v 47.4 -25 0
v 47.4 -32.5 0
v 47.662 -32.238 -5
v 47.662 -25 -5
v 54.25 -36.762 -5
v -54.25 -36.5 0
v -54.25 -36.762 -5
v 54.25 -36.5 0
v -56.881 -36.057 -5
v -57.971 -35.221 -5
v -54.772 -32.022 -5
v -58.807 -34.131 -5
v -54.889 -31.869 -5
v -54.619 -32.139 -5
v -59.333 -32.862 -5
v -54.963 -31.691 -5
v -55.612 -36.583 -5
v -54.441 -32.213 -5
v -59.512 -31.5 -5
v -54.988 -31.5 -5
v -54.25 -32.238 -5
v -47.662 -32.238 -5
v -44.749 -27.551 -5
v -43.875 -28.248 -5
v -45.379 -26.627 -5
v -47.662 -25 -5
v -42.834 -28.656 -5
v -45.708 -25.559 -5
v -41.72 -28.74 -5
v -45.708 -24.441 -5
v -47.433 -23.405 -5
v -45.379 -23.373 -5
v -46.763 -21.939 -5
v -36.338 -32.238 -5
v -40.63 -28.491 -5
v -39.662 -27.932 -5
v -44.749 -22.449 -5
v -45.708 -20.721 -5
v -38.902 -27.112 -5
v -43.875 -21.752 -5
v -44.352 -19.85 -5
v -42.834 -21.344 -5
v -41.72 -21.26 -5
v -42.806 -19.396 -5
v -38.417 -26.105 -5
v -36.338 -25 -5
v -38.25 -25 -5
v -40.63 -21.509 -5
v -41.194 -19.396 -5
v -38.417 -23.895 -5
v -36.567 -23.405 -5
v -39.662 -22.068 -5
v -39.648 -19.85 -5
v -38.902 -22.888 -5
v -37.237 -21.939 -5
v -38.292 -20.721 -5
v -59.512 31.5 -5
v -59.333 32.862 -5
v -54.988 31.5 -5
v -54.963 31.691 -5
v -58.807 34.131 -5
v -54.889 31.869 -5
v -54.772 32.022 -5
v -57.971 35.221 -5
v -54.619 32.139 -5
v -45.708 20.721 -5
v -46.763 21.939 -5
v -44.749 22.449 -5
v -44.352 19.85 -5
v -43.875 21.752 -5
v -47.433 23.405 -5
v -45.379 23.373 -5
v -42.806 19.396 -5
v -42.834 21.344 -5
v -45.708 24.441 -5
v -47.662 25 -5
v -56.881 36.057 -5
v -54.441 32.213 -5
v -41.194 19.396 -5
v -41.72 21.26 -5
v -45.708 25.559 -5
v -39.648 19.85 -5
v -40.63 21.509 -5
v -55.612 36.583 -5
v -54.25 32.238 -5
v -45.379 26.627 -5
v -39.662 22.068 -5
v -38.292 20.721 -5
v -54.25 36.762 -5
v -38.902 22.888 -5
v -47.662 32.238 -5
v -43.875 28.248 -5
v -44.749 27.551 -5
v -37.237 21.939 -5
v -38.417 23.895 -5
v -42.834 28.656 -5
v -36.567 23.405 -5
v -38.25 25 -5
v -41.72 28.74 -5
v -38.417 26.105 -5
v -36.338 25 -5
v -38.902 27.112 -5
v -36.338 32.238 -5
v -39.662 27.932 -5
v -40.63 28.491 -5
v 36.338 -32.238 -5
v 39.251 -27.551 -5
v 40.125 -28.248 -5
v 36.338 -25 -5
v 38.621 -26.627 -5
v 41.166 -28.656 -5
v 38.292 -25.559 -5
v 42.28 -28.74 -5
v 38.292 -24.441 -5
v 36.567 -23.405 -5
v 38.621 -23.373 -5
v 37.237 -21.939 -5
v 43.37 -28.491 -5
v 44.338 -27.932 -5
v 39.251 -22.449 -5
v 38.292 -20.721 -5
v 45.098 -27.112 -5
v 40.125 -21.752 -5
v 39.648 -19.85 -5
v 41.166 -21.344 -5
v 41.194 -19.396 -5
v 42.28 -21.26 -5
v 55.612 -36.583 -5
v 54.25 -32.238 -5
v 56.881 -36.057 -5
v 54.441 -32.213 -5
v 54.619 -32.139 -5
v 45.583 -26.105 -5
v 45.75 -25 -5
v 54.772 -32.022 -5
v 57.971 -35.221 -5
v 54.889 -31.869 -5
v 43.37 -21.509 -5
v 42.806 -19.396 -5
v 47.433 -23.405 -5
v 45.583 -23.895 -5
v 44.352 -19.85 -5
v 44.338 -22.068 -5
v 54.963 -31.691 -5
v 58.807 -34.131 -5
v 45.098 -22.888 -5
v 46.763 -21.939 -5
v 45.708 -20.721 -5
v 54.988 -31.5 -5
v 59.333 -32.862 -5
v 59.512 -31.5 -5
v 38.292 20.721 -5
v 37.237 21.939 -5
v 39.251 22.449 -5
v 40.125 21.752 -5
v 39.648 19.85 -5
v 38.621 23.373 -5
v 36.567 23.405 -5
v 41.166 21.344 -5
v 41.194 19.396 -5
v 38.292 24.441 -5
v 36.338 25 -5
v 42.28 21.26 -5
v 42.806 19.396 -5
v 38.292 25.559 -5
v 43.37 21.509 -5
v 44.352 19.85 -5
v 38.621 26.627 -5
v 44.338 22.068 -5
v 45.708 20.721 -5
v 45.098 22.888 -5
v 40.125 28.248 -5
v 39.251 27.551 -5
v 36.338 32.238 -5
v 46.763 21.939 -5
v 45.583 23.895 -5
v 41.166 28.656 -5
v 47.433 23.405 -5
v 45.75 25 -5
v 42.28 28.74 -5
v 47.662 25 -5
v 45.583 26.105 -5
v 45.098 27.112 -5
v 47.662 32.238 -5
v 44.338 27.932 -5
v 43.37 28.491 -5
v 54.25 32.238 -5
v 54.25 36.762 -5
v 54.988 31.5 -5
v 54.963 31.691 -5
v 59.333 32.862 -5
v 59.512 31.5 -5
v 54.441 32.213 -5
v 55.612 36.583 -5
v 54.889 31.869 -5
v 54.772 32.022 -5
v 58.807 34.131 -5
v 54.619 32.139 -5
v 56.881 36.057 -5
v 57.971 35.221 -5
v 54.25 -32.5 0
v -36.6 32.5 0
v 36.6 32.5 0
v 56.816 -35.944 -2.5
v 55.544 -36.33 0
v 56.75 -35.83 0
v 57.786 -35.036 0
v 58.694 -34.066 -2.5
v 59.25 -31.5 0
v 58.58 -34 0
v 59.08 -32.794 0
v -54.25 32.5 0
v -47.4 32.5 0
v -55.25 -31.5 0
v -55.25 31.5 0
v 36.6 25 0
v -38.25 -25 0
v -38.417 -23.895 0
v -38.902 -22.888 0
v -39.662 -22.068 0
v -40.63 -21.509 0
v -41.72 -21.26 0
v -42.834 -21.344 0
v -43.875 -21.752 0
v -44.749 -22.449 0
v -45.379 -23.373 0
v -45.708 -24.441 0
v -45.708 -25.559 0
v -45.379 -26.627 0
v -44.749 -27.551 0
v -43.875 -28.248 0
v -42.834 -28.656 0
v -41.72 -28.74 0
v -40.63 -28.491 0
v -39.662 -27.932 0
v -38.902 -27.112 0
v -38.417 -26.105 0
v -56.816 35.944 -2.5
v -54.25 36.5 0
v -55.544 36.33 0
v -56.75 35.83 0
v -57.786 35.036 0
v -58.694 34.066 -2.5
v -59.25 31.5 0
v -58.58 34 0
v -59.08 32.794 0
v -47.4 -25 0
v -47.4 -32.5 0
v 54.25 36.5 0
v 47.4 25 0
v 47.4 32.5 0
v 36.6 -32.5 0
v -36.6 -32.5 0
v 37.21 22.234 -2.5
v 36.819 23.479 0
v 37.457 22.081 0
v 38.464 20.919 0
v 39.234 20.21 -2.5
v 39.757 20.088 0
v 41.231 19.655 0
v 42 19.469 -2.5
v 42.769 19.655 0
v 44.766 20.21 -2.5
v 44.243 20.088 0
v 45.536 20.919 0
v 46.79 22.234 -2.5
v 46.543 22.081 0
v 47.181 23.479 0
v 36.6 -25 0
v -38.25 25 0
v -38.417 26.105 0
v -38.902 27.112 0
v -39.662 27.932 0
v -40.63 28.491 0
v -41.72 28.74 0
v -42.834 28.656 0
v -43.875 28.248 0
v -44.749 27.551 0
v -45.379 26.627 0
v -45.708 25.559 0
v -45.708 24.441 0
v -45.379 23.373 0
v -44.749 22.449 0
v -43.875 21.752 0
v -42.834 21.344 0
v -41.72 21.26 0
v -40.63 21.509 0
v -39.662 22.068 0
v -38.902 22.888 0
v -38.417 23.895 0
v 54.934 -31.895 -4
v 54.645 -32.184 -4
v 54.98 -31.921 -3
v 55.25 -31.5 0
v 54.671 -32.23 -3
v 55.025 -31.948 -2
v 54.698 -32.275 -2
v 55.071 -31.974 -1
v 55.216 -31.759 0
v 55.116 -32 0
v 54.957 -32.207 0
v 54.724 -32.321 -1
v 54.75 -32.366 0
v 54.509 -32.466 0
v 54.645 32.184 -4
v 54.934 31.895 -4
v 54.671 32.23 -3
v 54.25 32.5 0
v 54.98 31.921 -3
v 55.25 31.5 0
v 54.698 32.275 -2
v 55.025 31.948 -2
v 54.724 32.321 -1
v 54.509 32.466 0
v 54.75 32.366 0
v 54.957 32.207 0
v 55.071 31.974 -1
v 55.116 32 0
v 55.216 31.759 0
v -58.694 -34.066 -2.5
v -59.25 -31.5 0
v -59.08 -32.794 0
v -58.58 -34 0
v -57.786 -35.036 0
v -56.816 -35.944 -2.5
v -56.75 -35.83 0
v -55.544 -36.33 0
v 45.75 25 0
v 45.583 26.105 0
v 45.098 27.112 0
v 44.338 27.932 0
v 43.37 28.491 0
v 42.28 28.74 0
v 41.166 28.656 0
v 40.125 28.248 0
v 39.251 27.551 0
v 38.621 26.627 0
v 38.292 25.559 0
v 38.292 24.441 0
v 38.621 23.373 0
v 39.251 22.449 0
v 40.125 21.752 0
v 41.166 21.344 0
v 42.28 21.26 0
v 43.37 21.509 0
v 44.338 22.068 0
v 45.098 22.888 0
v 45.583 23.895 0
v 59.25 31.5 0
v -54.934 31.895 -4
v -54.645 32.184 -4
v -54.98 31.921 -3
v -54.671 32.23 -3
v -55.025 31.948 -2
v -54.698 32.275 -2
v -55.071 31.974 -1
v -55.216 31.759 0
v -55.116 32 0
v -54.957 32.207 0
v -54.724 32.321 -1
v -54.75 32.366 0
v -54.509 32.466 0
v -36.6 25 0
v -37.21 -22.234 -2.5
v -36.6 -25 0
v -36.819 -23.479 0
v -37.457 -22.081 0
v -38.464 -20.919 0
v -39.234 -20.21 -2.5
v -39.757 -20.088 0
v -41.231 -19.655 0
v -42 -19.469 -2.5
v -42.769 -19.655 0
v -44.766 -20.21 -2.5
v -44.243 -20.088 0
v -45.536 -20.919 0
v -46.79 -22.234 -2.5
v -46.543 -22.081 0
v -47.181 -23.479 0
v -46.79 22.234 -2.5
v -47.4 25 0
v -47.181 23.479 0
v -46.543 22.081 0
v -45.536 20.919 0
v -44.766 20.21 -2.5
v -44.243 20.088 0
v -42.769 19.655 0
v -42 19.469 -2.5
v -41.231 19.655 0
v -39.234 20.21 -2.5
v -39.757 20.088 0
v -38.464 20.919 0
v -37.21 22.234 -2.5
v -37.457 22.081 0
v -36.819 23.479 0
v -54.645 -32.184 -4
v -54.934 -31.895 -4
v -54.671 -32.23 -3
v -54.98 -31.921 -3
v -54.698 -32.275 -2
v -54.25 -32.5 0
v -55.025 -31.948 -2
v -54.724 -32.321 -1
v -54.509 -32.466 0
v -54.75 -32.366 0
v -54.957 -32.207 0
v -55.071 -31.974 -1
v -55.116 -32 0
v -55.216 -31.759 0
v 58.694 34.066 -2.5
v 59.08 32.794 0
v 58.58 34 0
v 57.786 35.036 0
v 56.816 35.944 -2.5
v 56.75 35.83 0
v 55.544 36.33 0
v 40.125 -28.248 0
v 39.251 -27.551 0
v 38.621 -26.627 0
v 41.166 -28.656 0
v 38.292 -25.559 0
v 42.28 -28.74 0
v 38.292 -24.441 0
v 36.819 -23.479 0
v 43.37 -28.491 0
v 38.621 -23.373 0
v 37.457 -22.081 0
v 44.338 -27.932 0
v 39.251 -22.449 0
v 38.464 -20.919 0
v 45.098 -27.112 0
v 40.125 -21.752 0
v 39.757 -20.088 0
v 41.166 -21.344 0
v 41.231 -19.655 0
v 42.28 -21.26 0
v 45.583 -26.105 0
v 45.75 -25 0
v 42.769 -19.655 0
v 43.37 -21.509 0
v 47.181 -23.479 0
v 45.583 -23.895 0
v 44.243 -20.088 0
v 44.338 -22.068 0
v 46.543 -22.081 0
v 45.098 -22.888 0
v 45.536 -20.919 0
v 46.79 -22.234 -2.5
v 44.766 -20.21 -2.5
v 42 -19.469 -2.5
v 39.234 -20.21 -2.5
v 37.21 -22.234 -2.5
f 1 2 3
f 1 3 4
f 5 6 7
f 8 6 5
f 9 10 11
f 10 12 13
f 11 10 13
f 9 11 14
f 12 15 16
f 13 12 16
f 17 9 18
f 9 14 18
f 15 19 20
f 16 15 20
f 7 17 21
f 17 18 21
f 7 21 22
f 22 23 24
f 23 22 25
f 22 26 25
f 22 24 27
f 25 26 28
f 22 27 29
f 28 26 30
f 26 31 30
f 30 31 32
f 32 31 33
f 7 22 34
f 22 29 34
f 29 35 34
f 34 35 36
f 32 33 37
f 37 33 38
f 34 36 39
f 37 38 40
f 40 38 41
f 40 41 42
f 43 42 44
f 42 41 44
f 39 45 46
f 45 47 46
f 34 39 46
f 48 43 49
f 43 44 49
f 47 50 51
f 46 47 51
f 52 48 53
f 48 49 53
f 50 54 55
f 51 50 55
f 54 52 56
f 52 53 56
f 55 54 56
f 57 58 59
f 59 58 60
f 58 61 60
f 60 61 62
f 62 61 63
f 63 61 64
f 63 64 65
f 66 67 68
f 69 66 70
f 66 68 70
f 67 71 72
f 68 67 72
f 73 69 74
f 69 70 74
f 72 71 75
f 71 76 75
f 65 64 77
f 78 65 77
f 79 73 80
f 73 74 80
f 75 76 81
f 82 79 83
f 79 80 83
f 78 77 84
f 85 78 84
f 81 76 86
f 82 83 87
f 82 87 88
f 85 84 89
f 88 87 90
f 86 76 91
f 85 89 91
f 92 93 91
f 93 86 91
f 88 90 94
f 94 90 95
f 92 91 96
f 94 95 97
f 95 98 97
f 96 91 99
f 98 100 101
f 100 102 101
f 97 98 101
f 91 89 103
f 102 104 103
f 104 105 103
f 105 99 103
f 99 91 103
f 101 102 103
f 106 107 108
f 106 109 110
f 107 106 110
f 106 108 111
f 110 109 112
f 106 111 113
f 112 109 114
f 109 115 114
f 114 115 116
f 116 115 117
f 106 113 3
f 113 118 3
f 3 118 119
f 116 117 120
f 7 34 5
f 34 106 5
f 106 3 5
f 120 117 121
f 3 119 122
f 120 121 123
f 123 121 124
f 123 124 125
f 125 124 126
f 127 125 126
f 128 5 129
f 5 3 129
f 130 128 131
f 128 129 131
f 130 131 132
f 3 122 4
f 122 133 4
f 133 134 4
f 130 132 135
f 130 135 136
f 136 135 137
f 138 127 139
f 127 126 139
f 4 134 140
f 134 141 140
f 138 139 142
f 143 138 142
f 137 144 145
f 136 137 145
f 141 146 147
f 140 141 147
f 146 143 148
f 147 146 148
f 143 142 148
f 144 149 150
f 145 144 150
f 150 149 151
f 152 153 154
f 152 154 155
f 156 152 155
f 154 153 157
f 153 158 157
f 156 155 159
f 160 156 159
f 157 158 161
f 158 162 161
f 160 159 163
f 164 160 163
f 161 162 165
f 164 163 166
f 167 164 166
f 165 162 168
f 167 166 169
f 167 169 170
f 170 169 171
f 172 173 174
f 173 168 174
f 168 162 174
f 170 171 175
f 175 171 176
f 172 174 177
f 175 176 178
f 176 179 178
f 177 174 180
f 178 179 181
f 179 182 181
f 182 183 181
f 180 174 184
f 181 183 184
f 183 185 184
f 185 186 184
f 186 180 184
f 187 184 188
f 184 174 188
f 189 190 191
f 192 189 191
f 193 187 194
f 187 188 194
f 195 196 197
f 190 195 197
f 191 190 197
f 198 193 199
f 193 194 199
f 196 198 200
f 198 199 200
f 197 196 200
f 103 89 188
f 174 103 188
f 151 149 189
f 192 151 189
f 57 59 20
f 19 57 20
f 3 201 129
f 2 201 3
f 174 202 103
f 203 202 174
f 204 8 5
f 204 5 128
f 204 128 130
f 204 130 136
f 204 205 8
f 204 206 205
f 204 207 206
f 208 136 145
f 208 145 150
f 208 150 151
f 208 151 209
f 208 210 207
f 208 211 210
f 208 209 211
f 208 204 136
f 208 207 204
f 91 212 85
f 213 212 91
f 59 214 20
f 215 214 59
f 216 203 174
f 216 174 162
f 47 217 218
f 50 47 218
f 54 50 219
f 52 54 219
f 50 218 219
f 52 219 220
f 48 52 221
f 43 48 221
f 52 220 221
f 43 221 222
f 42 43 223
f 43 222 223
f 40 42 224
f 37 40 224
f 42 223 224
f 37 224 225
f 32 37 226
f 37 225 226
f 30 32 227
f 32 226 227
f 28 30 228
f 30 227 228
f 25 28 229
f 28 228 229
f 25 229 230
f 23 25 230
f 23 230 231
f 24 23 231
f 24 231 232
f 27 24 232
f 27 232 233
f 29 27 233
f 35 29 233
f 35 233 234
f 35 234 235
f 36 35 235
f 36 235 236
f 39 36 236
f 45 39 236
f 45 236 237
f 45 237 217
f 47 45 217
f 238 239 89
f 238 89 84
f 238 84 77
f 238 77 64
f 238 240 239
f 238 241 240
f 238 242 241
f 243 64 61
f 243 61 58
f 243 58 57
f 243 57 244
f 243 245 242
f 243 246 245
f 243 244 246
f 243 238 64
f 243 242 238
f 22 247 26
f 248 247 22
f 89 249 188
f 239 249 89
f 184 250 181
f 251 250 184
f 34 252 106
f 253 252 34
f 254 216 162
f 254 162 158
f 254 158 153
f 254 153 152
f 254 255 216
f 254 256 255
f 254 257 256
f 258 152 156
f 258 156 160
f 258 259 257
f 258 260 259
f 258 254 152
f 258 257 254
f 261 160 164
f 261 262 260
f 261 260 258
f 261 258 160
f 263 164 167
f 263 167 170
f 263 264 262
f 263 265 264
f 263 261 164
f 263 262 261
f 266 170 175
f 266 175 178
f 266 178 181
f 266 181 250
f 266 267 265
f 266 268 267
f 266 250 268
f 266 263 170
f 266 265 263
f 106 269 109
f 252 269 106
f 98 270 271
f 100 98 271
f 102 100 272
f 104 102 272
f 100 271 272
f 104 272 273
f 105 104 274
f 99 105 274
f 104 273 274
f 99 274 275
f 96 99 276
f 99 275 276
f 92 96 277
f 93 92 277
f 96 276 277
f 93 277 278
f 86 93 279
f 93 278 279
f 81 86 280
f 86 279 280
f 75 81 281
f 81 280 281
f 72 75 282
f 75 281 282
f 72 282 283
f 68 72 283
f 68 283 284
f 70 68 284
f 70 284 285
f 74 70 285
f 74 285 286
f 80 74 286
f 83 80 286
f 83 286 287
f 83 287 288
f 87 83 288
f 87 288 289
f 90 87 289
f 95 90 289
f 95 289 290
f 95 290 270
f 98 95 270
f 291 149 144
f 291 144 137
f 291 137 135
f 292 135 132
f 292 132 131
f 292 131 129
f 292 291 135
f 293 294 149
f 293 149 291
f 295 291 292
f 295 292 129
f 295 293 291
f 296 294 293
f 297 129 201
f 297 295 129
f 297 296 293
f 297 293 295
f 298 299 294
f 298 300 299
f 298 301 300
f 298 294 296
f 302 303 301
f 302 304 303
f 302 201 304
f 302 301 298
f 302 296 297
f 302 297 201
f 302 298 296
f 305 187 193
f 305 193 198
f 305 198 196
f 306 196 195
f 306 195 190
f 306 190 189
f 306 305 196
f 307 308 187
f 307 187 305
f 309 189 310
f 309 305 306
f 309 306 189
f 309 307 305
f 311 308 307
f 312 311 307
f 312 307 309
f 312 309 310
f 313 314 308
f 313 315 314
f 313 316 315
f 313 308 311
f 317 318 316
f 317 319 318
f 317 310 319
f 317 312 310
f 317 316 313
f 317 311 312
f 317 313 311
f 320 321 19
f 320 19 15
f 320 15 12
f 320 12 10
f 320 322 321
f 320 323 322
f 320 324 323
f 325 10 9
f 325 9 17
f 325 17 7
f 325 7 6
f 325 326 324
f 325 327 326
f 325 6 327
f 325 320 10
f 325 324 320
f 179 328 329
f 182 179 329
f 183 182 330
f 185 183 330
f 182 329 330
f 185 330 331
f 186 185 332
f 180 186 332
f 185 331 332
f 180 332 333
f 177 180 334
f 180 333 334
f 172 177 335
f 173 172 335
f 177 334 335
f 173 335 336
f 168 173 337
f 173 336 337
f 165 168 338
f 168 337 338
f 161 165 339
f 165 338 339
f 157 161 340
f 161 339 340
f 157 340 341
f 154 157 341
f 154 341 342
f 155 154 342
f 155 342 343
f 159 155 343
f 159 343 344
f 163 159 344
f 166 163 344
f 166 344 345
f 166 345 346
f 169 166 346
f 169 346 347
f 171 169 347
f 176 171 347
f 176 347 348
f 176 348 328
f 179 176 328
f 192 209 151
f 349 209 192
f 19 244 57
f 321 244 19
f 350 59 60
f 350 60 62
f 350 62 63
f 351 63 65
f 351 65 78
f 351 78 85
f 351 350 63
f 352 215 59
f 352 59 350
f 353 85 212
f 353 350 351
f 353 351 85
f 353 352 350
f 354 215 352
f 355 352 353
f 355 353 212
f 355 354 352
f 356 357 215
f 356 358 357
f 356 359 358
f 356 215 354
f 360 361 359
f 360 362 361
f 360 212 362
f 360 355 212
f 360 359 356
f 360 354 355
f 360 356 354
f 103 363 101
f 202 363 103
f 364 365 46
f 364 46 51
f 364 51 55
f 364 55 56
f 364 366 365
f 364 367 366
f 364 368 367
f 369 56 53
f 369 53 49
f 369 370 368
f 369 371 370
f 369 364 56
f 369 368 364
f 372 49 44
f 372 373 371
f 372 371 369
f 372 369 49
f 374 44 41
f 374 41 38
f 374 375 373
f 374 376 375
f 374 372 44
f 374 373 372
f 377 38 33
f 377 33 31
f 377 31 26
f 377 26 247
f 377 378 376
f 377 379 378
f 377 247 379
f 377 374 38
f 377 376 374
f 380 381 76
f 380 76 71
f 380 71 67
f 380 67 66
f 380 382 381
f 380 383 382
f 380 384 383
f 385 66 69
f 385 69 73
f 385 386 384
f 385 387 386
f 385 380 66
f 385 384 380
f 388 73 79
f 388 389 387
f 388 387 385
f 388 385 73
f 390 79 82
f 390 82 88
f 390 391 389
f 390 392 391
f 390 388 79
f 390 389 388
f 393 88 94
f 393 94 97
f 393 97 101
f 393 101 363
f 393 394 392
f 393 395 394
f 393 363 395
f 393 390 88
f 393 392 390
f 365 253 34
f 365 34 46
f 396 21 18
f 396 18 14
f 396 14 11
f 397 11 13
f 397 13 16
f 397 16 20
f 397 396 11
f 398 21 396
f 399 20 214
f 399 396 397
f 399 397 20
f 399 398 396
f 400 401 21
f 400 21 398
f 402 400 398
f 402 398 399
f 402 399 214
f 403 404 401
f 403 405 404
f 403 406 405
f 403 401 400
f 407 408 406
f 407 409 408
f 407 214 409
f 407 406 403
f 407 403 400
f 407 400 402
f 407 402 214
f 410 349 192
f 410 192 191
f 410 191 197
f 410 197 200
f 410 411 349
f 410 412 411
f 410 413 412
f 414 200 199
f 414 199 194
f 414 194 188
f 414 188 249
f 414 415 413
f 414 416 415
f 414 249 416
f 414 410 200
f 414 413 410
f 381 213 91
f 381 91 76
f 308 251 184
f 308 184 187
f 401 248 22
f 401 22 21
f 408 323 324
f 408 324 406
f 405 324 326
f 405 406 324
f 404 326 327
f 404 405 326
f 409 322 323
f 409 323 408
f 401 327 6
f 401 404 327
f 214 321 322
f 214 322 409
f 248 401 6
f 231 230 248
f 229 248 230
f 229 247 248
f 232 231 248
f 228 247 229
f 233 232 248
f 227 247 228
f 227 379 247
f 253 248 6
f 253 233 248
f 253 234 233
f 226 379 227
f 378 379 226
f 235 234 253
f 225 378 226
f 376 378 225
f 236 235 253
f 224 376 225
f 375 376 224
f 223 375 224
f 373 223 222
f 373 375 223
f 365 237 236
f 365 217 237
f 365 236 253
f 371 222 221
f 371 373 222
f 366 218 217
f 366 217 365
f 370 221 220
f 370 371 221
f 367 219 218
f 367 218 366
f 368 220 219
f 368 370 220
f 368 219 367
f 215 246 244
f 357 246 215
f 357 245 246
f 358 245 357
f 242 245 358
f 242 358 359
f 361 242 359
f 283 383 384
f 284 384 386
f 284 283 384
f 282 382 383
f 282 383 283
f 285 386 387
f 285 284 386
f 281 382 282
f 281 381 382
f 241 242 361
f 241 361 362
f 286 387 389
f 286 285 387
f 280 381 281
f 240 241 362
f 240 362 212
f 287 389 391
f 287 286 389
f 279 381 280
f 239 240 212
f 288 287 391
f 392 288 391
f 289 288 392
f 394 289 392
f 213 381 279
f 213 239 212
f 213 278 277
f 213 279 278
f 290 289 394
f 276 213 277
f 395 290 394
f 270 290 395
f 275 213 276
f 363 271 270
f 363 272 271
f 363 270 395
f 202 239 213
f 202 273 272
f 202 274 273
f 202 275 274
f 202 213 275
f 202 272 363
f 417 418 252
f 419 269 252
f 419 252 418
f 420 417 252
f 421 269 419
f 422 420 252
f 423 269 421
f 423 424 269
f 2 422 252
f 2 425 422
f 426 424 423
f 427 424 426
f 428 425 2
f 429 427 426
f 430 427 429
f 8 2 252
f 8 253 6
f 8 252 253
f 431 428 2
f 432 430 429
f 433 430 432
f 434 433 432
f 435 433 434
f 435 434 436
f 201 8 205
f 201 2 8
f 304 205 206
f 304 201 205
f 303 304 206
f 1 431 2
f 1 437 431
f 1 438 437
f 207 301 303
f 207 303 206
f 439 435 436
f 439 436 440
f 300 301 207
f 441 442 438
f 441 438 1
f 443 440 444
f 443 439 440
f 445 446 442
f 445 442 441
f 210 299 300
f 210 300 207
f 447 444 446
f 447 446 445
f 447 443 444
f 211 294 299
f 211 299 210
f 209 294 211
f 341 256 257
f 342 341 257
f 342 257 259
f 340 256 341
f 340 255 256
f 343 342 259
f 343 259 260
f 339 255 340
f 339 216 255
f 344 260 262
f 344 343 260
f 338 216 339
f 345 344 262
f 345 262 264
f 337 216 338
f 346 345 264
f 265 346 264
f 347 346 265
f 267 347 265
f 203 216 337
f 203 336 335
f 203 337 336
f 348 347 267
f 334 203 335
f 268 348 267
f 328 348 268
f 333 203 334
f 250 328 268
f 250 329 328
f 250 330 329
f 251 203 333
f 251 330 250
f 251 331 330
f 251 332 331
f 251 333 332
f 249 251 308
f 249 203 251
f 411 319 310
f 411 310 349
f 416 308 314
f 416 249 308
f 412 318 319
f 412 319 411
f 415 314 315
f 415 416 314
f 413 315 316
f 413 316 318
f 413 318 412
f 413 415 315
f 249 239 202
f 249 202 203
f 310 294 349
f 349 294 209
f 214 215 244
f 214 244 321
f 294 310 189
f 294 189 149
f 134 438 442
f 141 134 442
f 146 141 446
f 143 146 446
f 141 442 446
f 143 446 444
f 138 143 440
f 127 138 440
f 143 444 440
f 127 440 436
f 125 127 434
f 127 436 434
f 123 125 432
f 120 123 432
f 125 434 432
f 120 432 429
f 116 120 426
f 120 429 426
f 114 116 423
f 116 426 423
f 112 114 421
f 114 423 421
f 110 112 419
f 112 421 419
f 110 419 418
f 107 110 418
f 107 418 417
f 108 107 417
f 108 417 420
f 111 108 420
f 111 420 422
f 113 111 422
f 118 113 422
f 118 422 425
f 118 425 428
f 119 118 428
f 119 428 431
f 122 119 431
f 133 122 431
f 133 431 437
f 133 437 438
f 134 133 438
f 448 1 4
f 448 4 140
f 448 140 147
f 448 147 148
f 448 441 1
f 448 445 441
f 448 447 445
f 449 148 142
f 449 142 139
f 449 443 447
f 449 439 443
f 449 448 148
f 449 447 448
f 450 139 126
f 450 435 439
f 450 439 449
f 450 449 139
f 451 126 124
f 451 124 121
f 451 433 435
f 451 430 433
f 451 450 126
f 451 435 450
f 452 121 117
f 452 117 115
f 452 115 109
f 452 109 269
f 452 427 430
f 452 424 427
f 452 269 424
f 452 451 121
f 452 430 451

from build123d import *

# Parameters (mm, degrees)
EXTRUDE_5_DEPTH     = 5
EXTRUDE_5_DRAFT     = 3
SKETCH_1_9_R        = 3.75
CUT_EXTRUDE_1_DEPTH = 71.129382412


with BuildPart() as part:
    # ｽｹｯﾁ1 → ﾎﾞｽ - 押し出し5 (with draft: the straight prism first)
    with BuildSketch(Plane.XY):
        with BuildLine():
            ThreePointArc((-59.25, -31.5), (-57.785533906, -35.035533906), (-54.25, -36.5))
            Line((-54.25, -36.5), (54.25, -36.5))
            ThreePointArc((54.25, -36.5), (57.785533906, -35.035533906), (59.25, -31.5))
            Line((59.25, -31.5), (59.25, 31.5))
            ThreePointArc((59.25, 31.5), (57.785533906, 35.035533906), (54.25, 36.5))
            Line((54.25, 36.5), (-54.25, 36.5))
            ThreePointArc((-54.25, 36.5), (-57.785533906, 35.035533906), (-59.25, 31.5))
            Line((-59.25, 31.5), (-59.25, -31.5))
        make_face()
        with BuildLine():
            Line((-54.25, 32.5), (-47.4, 32.5))
            Line((-47.4, 32.5), (-47.4, 25))
            ThreePointArc((-47.4, 25), (-42, 19.6), (-36.6, 25))
            Line((-36.6, 25), (-36.6, 32.5))
            Line((-36.6, 32.5), (36.6, 32.5))
            Line((36.6, 32.5), (36.6, 25))
            ThreePointArc((36.6, 25), (42, 19.6), (47.4, 25))
            Line((47.4, 25), (47.4, 32.5))
            Line((47.4, 32.5), (54.25, 32.5))
            ThreePointArc((54.25, 32.5), (54.957106781, 32.207106781), (55.25, 31.5))
            Line((55.25, 31.5), (55.25, -31.5))
            ThreePointArc((55.25, -31.5), (54.957106781, -32.207106781), (54.25, -32.5))
            Line((54.25, -32.5), (47.4, -32.5))
            Line((47.4, -32.5), (47.4, -25))
            ThreePointArc((47.4, -25), (42, -19.6), (36.6, -25))
            Line((36.6, -25), (36.6, -32.5))
            Line((36.6, -32.5), (-36.6, -32.5))
            Line((-36.6, -32.5), (-36.6, -25))
            ThreePointArc((-36.6, -25), (-42, -19.6), (-47.4, -25))
            Line((-47.4, -25), (-47.4, -32.5))
            Line((-47.4, -32.5), (-54.25, -32.5))
            ThreePointArc((-54.25, -32.5), (-54.957106781, -32.207106781), (-55.25, -31.5))
            Line((-55.25, -31.5), (-55.25, 31.5))
            ThreePointArc((-55.25, 31.5), (-54.957106781, 32.207106781), (-54.25, 32.5))
        make_face(mode=Mode.SUBTRACT)
    extrude(amount=-EXTRUDE_5_DEPTH)
    # ﾎﾞｽ - 押し出し5: the draft: its side faces are tilted about the plane it starts from
    extrude_5_sides = [part.faces().sort_by_distance(p)[0] for p in [
        (-57.785533906, -35.035533906, -2.5),
        (0, -36.5, -2.5),
        (57.785533906, -35.035533906, -2.5),
        (59.25, 0, -2.5),
        (57.785533906, 35.035533906, -2.5),
        (0, 36.5, -2.5),
        (-57.785533906, 35.035533906, -2.5),
        (-59.25, 0, -2.5),
        (-50.825, 32.5, -2.5),
        (-47.4, 28.75, -2.5),
        (-42, 19.6, -2.5),
        (-36.6, 28.75, -2.5),
        (0, 32.5, -2.5),
        (36.6, 28.75, -2.5),
        (42, 19.6, -2.5),
        (47.4, 28.75, -2.5),
        (50.825, 32.5, -2.5),
        (54.957106781, 32.207106781, -2.5),
        (55.25, 0, -2.5),
        (54.957106781, -32.207106781, -2.5),
        (50.825, -32.5, -2.5),
        (47.4, -28.75, -2.5),
        (42, -19.6, -2.5),
        (36.6, -28.75, -2.5),
        (0, -32.5, -2.5),
        (-36.6, -28.75, -2.5),
        (-42, -19.6, -2.5),
        (-47.4, -28.75, -2.5),
        (-50.825, -32.5, -2.5),
        (-54.957106781, -32.207106781, -2.5),
        (-55.25, 0, -2.5),
        (-54.957106781, 32.207106781, -2.5),
    ]]
    draft(extrude_5_sides, Plane.XY, EXTRUDE_5_DRAFT)

    # ｽｹｯﾁ1<9> → ｶｯﾄ - 押し出し1 (cut, through all)
    with BuildSketch(Plane.XY):
        with Locations((-42, 25)):
            Circle(SKETCH_1_9_R)
        with Locations((-42, -25)):
            Circle(SKETCH_1_9_R)
        with Locations((42, -25)):
            Circle(SKETCH_1_9_R)
        with Locations((42, 25)):
            Circle(SKETCH_1_9_R)
    extrude(amount=-CUT_EXTRUDE_1_DEPTH, mode=Mode.SUBTRACT)


solid = part.part
